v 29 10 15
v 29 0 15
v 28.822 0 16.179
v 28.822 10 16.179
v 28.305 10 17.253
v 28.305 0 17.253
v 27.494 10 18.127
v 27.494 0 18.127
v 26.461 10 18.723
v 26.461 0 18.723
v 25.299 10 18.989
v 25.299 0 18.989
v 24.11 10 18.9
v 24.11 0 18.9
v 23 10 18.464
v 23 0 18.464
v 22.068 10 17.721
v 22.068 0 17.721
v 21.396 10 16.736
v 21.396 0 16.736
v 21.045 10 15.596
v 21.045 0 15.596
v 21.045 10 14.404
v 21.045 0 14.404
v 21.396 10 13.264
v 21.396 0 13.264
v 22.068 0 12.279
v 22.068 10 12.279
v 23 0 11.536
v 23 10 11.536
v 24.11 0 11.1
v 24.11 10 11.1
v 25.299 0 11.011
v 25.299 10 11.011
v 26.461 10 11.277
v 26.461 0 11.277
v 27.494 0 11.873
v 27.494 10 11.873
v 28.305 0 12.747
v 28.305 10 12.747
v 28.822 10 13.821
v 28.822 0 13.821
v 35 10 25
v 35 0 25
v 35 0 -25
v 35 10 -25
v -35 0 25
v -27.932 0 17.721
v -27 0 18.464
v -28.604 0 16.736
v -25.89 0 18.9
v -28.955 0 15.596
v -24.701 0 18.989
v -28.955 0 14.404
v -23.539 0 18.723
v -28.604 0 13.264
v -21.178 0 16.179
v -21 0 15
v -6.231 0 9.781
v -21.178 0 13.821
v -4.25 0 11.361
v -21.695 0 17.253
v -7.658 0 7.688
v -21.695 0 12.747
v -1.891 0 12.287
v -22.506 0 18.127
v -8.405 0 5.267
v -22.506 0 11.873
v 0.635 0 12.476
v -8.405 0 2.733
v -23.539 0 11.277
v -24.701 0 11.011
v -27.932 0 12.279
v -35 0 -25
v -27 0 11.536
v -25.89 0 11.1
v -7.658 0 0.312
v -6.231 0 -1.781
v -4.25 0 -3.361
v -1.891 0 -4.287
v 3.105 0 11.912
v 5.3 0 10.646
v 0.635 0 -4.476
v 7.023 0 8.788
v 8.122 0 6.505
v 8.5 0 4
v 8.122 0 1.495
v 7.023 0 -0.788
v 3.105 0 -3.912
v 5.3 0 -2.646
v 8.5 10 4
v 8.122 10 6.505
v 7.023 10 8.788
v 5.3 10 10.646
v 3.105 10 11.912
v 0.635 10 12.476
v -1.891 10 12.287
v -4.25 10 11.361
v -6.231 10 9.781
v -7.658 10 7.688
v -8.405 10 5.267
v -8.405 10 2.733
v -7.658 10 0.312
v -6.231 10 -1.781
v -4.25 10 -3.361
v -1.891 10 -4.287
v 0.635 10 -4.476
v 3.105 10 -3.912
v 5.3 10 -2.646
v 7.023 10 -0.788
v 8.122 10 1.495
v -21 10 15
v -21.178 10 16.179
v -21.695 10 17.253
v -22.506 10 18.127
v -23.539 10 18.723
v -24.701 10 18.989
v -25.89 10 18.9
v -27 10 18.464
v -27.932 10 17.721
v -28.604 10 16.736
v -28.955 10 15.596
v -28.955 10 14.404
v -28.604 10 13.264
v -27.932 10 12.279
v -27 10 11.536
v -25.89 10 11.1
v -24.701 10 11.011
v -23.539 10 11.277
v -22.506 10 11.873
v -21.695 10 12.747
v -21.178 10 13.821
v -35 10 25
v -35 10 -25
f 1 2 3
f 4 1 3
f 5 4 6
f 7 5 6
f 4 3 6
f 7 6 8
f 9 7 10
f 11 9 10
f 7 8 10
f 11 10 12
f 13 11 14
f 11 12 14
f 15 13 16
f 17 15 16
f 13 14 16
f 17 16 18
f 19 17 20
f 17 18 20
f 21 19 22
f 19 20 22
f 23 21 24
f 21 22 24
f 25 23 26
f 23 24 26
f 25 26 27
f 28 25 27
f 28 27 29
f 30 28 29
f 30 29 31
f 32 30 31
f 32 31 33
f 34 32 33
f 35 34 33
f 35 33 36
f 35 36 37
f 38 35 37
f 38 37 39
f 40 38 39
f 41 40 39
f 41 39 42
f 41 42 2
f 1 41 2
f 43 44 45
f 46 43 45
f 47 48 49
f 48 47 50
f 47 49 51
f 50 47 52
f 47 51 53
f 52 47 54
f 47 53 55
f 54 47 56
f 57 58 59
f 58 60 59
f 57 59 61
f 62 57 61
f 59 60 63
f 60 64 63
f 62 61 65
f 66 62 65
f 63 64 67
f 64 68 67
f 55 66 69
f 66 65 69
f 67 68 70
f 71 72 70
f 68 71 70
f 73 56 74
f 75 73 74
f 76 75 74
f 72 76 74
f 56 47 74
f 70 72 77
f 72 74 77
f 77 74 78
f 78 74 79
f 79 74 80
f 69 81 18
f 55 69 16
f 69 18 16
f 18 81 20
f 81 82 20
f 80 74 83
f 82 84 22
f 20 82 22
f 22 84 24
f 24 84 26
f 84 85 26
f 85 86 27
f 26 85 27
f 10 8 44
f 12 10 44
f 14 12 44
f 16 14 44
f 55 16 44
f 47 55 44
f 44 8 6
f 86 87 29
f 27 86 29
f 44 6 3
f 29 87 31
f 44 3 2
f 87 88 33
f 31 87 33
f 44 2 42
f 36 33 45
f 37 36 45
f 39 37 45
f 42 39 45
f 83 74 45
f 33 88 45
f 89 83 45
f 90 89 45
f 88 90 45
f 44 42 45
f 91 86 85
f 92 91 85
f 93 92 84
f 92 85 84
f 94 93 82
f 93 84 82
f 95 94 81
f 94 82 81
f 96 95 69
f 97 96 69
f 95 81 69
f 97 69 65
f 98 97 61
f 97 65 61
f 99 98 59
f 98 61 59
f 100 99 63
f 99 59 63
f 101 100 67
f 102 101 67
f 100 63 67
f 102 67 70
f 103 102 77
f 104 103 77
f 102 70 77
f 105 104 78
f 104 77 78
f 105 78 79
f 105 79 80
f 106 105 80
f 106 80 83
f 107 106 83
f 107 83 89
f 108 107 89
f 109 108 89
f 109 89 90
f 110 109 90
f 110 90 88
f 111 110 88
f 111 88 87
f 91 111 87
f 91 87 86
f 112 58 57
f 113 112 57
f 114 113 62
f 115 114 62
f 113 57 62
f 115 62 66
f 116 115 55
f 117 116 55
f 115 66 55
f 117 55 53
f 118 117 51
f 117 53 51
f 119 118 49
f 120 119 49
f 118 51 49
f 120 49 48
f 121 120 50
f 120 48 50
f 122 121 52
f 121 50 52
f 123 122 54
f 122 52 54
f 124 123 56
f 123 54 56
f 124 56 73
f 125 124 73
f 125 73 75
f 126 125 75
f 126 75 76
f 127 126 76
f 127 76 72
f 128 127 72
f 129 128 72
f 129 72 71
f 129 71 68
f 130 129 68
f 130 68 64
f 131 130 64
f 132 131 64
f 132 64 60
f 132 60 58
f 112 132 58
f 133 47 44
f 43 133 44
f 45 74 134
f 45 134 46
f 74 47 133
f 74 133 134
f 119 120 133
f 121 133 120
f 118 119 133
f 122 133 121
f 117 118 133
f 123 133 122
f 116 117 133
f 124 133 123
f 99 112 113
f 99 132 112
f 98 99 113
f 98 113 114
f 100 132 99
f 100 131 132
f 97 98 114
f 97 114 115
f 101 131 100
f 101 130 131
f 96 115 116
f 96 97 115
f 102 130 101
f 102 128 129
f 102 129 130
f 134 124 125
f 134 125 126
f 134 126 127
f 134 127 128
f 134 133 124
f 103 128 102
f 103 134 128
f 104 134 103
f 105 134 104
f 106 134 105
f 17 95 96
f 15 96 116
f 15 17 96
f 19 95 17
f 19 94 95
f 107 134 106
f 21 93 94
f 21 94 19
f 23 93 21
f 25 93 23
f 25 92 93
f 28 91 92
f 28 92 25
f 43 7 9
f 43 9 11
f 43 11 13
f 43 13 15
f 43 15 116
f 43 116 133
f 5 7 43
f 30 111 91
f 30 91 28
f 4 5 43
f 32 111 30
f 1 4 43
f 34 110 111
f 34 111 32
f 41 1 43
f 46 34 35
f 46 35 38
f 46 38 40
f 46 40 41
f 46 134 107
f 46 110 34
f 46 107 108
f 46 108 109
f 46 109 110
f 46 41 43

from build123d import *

# Parameters (mm, degrees)
SKETCH2_W           = 70
SKETCH2_H           = 50
BOSS_EXTRUDE1_DEPTH = 10
SKETCH3_R           = 4
CUT_EXTRUDE1_DEPTH  = 11
SKETCH5_R           = 8.5
CUT_EXTRUDE3_DEPTH  = 11


with BuildPart() as part:
    # Sketch2 → Boss-Extrude1 (new body)
    with BuildSketch(Plane(origin=(0, 0, 0), x_dir=(1, 0, 0), z_dir=(0, 1, 0))):
        Rectangle(SKETCH2_W, SKETCH2_H)
    extrude(amount=BOSS_EXTRUDE1_DEPTH)

    # Sketch3 → Cut-Extrude1 (cut, through all)
    with BuildSketch(Plane.XZ):
        with Locations((-25, 15)):
            Circle(SKETCH3_R)
        with Locations((25, 15)):
            Circle(SKETCH3_R)
    extrude(amount=-CUT_EXTRUDE1_DEPTH, mode=Mode.SUBTRACT)

    # Sketch5 → Cut-Extrude3 (cut, through all)
    with BuildSketch(Plane.XZ):
        with Locations((0, 4)):
            Circle(SKETCH5_R)
    extrude(amount=-CUT_EXTRUDE3_DEPTH, mode=Mode.SUBTRACT)


solid = part.part
